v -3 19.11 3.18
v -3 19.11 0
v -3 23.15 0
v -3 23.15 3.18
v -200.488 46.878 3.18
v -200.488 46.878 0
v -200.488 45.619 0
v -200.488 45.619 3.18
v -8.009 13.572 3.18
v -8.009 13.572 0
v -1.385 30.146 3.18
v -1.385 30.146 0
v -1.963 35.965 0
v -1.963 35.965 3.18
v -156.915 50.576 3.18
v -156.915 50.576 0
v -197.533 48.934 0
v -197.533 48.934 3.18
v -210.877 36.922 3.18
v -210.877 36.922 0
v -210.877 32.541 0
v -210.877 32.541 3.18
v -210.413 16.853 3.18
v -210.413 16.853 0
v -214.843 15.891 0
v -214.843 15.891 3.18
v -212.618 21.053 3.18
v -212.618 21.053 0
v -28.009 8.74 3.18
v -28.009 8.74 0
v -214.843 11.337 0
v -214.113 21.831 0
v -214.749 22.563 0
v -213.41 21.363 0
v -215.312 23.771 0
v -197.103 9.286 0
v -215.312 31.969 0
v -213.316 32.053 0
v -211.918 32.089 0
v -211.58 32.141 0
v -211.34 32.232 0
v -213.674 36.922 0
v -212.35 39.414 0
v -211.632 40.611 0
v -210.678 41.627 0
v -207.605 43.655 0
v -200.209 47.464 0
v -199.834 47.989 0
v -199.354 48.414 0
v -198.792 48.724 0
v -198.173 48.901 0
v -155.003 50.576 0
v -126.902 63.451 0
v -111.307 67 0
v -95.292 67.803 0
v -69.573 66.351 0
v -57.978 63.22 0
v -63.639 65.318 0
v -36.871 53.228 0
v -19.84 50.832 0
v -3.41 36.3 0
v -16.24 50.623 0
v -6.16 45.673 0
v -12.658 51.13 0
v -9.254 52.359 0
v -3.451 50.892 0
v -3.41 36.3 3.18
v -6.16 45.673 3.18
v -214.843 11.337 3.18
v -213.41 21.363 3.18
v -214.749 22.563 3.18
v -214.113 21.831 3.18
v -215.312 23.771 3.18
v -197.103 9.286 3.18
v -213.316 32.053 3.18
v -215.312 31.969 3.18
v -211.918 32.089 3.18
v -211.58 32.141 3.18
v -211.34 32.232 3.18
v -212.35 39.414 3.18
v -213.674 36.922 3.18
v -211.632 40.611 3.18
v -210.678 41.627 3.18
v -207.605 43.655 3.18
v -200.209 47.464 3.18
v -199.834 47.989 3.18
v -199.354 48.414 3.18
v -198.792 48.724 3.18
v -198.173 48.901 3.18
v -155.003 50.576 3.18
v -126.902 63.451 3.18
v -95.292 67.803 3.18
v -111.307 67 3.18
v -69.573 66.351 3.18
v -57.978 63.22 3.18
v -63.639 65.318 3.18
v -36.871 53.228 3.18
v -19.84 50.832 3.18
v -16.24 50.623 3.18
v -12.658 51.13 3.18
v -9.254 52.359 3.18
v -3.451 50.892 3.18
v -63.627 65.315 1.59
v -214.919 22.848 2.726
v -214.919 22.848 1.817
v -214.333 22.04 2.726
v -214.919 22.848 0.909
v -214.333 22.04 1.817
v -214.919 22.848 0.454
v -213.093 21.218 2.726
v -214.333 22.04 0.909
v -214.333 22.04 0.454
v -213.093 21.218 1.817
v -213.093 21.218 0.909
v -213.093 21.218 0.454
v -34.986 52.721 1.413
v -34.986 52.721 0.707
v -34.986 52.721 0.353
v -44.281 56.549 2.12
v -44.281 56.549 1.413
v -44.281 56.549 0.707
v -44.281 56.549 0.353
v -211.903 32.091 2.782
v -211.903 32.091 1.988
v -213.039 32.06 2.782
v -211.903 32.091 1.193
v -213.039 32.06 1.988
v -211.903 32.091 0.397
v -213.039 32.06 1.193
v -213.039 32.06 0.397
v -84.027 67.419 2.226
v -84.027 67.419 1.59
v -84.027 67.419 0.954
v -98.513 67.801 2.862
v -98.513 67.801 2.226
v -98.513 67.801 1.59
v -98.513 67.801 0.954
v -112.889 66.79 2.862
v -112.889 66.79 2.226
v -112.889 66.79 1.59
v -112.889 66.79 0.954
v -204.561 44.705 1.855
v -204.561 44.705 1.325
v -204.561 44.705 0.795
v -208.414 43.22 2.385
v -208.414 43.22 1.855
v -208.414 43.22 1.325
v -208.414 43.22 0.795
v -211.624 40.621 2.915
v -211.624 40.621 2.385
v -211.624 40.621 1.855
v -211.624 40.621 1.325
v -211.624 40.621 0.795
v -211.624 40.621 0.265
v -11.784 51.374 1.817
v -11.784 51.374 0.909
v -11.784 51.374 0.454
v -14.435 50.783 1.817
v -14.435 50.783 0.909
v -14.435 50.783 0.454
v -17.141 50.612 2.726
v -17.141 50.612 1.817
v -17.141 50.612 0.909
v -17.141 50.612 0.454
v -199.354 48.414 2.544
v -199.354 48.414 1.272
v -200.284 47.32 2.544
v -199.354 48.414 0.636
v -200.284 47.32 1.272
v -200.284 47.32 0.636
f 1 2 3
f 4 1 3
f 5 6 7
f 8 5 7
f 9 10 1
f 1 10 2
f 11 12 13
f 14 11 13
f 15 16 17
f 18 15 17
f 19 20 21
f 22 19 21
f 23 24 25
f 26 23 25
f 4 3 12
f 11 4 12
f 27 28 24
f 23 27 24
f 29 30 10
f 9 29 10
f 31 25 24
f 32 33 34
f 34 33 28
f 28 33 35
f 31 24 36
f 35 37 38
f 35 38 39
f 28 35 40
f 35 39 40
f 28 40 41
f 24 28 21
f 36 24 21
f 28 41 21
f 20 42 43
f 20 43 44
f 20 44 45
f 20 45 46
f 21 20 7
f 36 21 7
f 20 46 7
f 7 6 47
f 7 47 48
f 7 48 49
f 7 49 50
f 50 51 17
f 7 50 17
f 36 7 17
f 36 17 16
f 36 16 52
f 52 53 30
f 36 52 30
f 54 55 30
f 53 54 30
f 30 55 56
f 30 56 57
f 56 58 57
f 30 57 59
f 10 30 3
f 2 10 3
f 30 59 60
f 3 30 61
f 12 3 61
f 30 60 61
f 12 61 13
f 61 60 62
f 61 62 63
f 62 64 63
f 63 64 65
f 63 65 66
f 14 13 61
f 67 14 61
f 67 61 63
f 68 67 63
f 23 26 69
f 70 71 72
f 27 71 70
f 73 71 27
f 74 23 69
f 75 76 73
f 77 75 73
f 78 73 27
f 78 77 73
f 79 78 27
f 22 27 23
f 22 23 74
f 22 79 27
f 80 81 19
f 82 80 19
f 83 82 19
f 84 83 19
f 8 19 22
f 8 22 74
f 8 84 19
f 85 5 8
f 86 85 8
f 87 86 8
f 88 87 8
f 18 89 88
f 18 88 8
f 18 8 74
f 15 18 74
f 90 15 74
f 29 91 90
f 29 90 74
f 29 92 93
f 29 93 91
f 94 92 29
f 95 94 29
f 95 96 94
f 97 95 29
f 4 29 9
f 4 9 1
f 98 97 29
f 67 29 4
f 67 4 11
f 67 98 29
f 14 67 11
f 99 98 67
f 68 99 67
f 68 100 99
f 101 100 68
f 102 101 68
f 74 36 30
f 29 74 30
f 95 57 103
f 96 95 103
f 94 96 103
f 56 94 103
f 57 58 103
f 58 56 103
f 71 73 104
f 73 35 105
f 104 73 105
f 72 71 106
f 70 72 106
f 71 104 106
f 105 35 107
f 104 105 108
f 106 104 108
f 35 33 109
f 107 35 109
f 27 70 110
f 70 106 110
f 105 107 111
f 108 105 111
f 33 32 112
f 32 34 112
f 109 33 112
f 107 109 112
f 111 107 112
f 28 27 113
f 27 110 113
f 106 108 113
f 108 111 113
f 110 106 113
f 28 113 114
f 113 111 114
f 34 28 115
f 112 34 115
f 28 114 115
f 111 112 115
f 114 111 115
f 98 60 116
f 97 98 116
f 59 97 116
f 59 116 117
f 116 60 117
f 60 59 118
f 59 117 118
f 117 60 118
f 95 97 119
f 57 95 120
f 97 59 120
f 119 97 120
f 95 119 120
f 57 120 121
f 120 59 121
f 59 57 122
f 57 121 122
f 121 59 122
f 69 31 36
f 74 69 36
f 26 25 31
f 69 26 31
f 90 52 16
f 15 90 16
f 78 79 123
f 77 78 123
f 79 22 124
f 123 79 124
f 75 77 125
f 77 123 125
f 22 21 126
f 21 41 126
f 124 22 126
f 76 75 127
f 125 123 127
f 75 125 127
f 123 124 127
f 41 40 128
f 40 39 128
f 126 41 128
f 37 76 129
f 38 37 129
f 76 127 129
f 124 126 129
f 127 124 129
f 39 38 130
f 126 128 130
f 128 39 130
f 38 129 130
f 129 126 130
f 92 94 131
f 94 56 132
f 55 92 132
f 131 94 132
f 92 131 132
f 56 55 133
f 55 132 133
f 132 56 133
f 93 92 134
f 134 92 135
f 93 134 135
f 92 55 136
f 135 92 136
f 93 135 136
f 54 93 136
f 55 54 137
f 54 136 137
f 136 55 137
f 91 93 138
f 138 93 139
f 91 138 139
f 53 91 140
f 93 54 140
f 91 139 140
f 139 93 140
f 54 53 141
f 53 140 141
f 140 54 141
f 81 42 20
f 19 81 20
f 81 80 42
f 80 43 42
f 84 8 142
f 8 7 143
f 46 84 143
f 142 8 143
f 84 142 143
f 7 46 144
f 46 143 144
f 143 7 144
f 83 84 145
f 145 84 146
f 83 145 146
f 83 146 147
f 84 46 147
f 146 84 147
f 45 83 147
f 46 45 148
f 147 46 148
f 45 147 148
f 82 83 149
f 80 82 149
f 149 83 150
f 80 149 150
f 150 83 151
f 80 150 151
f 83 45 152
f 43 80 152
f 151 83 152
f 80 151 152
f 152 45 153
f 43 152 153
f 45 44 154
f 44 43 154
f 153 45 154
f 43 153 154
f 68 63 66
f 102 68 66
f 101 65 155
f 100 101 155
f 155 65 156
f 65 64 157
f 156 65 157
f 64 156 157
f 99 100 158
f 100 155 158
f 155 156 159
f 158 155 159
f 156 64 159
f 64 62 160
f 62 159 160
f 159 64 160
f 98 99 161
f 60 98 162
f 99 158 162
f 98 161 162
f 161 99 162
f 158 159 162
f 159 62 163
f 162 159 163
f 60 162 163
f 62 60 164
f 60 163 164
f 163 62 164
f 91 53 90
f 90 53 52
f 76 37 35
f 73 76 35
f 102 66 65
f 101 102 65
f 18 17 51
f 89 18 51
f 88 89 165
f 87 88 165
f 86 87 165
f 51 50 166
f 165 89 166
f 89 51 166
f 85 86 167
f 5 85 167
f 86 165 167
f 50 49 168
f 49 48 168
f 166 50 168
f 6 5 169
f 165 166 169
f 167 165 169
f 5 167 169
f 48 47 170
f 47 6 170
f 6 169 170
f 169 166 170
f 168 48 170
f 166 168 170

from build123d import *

# Parameters (mm, degrees)
BOSS_EXTRUDE1_DEPTH = 3.18


with BuildPart() as part:
    # Sketch1 → Boss-Extrude1 (new body)
    with BuildSketch(Plane.XY):
        with BuildLine():
            Line((-126.90183157, 63.451351123), (-155.002649134, 50.576))
            Line((-155.002649134, 50.576), (-156.915085055, 50.576))
            Line((-156.915085055, 50.576), (-197.532680285, 48.933631486))
            add(Edge.make_bspline(
                [(-197.532680285, 48.933631486), (-197.856938216, 48.954758252), (-198.175689042, 48.919514289), (-198.799707333, 48.740420096), (-199.089269759, 48.60100182), (-199.619237435, 48.22712778), (-199.847302364, 48.001548224), (-200.130777612, 47.605564254), (-200.213431577, 47.466364131), (-200.354340024, 47.173676097), (-200.419958888, 47.025100819), (-200.487796099, 46.87754919)],
                knots=[0, 0, 0, 0, 0.25, 0.25, 0.5, 0.5, 0.75, 0.75, 0.875, 0.875, 1, 1, 1, 1], degree=3))
            Line((-200.487796099, 46.87754919), (-200.487796099, 45.619190287))
            add(Edge.make_bspline(
                [(-200.487796099, 45.619190287), (-201.175292403, 45.504495406), (-201.855658011, 45.358549214), (-202.871912486, 45.120811128), (-203.209958375, 45.038472689), (-203.885830998, 44.872835338), (-204.223958167, 44.790853124), (-205.235951458, 44.534439775), (-205.906487656, 44.346277621), (-206.874996959, 43.986286634), (-207.191831701, 43.853034452), (-207.811823525, 43.556321951), (-208.418924997, 43.231140141), (-209.00527456, 42.860126187), (-209.584167639, 42.472644028), (-209.869399807, 42.273387637), (-210.694020174, 41.643506759), (-211.201483238, 41.178004532), (-211.73013182, 40.482204306), (-211.831050549, 40.336542937), (-212.018083165, 40.036660904), (-212.101621784, 39.881329534), (-212.681033882, 38.791115208), (-213.177672823, 37.856645785), (-213.674311764, 36.922176363)],
                knots=[0, 0, 0, 0, 0.125, 0.125, 0.1875, 0.1875, 0.25, 0.25, 0.375, 0.375, 0.4375, 0.4375, 0.5, 0.5625, 0.5625, 0.625, 0.625, 0.75, 0.75, 0.78125, 0.78125, 0.8125, 0.8125, 1, 1, 1, 1], degree=3))
            Line((-213.674311764, 36.922176363), (-210.877284017, 36.922176363))
            Line((-210.877284017, 36.922176363), (-210.877284017, 32.540772436))
            add(Edge.make_bspline(
                [(-210.877284017, 32.540772436), (-211.01960291, 32.409346329), (-211.181627568, 32.308403793), (-211.398218963, 32.203976442), (-211.442536276, 32.184489252), (-211.532145699, 32.153014843), (-211.577730345, 32.141242749), (-211.715600825, 32.111602843), (-211.80902927, 32.099543954), (-212.09120418, 32.072973702), (-212.281306192, 32.068469044), (-212.660362358, 32.06338607), (-212.849968469, 32.063384257), (-213.229001172, 32.057537609), (-213.418366995, 32.04971484), (-214.175802907, 32.017532543), (-214.743879841, 31.99339582), (-215.311956775, 31.969259097)],
                knots=[0, 0, 0, 0, 0.125, 0.125, 0.15625, 0.15625, 0.1875, 0.1875, 0.25, 0.25, 0.375, 0.375, 0.5, 0.5, 0.625, 0.625, 1, 1, 1, 1], degree=3))
            Line((-215.311956775, 31.969259097), (-215.311956775, 23.771206966))
            add(Edge.make_bspline(
                [(-215.311956775, 23.771206966), (-215.252651766, 23.614087197), (-215.195691348, 23.455737729), (-215.069051829, 23.145447933), (-214.998440356, 22.994452742), (-214.840114463, 22.702195632), (-214.75241985, 22.56092244), (-214.557151858, 22.289689045), (-214.448883791, 22.159284686), (-214.102194357, 21.800368316), (-213.838466215, 21.600407707), (-213.3989114, 21.353484525), (-213.247390183, 21.281360686), (-212.937649457, 21.155492936), (-212.778720347, 21.102500321), (-212.618220712, 21.053354457)],
                knots=[0, 0, 0, 0, 0.125, 0.125, 0.25, 0.25, 0.375, 0.375, 0.5, 0.5, 0.75, 0.75, 0.875, 0.875, 1, 1, 1, 1], degree=3))
            Line((-212.618220712, 21.053354457), (-210.413324841, 16.852708496))
            Line((-210.413324841, 16.852708496), (-214.842666667, 15.890688618))
            Line((-214.842666667, 15.890688618), (-214.842666667, 11.337489634))
            Line((-214.842666667, 11.337489634), (-197.102804327, 9.286029209))
            Line((-197.102804327, 9.286029209), (-28.009214442, 8.739519054))
            Line((-28.009214442, 8.739519054), (-8.008995649, 13.571514777))
            Line((-8.008995649, 13.571514777), (-3.000125196, 19.110373285))
            Line((-3.000125196, 19.110373285), (-3.000125196, 23.150277734))
            Line((-3.000125196, 23.150277734), (-1.385458215, 30.1458802))
            Line((-1.385458215, 30.1458802), (-1.963054434, 35.965465751))
            Line((-1.963054434, 35.965465751), (-3.410277854, 36.299501866))
            Line((-3.410277854, 36.299501866), (-6.15958565, 45.672965506))
            Line((-6.15958565, 45.672965506), (-3.451467886, 50.891534117))
            Line((-3.451467886, 50.891534117), (-9.2540276, 52.359494102))
            add(Edge.make_bspline(
                [(-9.2540276, 52.359494102), (-9.668938039, 52.177193353), (-10.082311797, 51.990757567), (-10.923946882, 51.657946755), (-11.350787182, 51.507747905), (-12.21693651, 51.240902135), (-12.656745199, 51.124231149), (-13.541049299, 50.927055953), (-13.986464066, 50.846222), (-14.883749808, 50.719684722), (-15.336640435, 50.673980514), (-16.239784909, 50.617569956), (-16.690860317, 50.606663408), (-18.042684657, 50.622754962), (-18.942033937, 50.698486568), (-19.839725309, 50.831943658)],
                knots=[0, 0, 0, 0, 0.125, 0.125, 0.25, 0.25, 0.375, 0.375, 0.5, 0.5, 0.625, 0.625, 0.75, 0.75, 1, 1, 1, 1], degree=3))
            add(Edge.make_bspline(
                [(-19.839725309, 50.831943658), (-23.196389637, 51.361628621), (-26.571655772, 51.738977688), (-30.372384718, 52.134386137), (-30.794736233, 52.177924879), (-31.639473894, 52.264718753), (-32.062038009, 52.307465354), (-33.326315143, 52.447060744), (-34.164847593, 52.554482825), (-35.806204141, 52.888039932), (-36.604486091, 53.1292754), (-38.181447383, 53.676915497), (-38.958811115, 53.987693889), (-41.268211651, 54.995464511), (-42.778587948, 55.7679407), (-45.783734721, 57.329402218), (-47.281168214, 58.120620227), (-51.793167154, 60.454082238), (-54.828124104, 61.954720164), (-57.978327556, 63.220213351)],
                knots=[0, 0, 0, 0, 0.25, 0.25, 0.28125, 0.28125, 0.3125, 0.3125, 0.375, 0.375, 0.4375, 0.4375, 0.5, 0.5, 0.625, 0.625, 0.75, 0.75, 1, 1, 1, 1], degree=3))
            add(Edge.make_bspline(
                [(-57.978327556, 63.220213351), (-59.798164817, 64.087622794), (-61.68095051, 64.789239178), (-65.573057504, 65.841379817), (-67.564024776, 66.185499955), (-69.57343092, 66.350830453)],
                knots=[0, 0, 0, 0, 0.5, 0.5, 1, 1, 1, 1], degree=3))
            add(Edge.make_bspline(
                [(-69.57343092, 66.350830453), (-70.776224616, 66.4631), (-71.980092265, 66.560752996), (-74.387874583, 66.755419067), (-75.591630106, 66.854598111), (-79.20418242, 67.134636215), (-81.61486975, 67.289764959), (-86.440099172, 67.547559017), (-88.853422865, 67.655029171), (-93.681704146, 67.795356063), (-96.096777782, 67.827180782), (-100.929760736, 67.774306212), (-103.340330508, 67.689526026), (-108.134351858, 67.365368434), (-110.519298799, 67.12601353), (-115.259021268, 66.454036055), (-117.613803047, 66.021453535), (-121.118607544, 65.197268693), (-122.282311533, 64.893303875), (-124.599756422, 64.221554126), (-125.753229336, 63.852052568), (-126.90183157, 63.451351123)],
                knots=[0, 0, 0, 0, 0.0625, 0.0625, 0.125, 0.125, 0.25, 0.25, 0.375, 0.375, 0.5, 0.5, 0.625, 0.625, 0.75, 0.75, 0.875, 0.875, 0.9375, 0.9375, 1, 1, 1, 1], degree=3))
        make_face()
    extrude(amount=BOSS_EXTRUDE1_DEPTH)


solid = part.part
